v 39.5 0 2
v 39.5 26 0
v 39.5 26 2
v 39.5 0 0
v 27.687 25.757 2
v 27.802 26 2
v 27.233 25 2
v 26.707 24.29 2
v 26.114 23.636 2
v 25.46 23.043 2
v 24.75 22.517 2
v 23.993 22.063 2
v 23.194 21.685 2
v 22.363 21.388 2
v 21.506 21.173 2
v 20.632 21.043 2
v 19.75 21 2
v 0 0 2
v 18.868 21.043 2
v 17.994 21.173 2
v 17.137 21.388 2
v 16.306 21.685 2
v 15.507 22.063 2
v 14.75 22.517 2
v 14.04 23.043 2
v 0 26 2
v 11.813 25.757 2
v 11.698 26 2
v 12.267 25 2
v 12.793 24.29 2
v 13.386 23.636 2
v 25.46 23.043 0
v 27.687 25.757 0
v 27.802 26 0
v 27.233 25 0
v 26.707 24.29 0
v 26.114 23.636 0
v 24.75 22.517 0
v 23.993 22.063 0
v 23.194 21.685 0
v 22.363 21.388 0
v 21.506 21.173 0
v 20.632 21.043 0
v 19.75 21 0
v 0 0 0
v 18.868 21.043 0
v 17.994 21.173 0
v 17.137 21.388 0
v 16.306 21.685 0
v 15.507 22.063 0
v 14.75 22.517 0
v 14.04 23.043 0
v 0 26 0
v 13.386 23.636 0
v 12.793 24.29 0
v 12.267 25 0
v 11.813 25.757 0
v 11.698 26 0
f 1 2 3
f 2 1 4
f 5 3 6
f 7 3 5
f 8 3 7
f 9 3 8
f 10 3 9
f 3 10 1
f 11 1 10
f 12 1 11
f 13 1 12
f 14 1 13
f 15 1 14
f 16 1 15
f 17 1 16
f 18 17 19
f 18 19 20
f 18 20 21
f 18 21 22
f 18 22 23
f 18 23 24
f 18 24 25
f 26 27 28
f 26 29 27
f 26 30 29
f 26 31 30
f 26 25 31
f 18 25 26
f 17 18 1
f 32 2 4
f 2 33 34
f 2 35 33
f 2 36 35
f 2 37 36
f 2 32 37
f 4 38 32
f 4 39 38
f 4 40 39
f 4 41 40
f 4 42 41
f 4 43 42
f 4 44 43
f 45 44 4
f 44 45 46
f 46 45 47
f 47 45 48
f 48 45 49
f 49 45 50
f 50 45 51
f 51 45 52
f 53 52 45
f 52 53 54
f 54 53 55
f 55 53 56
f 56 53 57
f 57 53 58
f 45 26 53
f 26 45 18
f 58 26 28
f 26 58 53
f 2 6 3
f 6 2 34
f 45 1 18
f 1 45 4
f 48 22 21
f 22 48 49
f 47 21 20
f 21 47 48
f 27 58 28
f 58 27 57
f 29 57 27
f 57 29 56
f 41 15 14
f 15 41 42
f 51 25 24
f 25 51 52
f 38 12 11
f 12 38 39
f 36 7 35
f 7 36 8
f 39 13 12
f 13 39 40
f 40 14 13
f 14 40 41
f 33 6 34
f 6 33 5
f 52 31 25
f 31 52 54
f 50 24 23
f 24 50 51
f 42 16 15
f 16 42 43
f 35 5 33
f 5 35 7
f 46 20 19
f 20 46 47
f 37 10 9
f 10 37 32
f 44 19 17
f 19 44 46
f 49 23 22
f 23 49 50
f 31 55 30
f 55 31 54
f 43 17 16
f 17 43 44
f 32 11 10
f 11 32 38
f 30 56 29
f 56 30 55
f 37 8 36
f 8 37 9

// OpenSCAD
// Divider, printed flat. Slides between the guide ribs in the base.
/* [Size] */
span = 39.5;     // [20:0.1:120] inner width minus clearance
height = 26;     // [10:1:80]
thickness = 2;   // [1.2:0.1:4]
/* [Hidden] */
$fn = $preview ? 32 : 64;
module divider() {
  difference() {
    cube([span, height, thickness]);
    translate([span/2, height + 4, -1]) cylinder(r = 9, h = thickness + 2);
  }
}
divider();
